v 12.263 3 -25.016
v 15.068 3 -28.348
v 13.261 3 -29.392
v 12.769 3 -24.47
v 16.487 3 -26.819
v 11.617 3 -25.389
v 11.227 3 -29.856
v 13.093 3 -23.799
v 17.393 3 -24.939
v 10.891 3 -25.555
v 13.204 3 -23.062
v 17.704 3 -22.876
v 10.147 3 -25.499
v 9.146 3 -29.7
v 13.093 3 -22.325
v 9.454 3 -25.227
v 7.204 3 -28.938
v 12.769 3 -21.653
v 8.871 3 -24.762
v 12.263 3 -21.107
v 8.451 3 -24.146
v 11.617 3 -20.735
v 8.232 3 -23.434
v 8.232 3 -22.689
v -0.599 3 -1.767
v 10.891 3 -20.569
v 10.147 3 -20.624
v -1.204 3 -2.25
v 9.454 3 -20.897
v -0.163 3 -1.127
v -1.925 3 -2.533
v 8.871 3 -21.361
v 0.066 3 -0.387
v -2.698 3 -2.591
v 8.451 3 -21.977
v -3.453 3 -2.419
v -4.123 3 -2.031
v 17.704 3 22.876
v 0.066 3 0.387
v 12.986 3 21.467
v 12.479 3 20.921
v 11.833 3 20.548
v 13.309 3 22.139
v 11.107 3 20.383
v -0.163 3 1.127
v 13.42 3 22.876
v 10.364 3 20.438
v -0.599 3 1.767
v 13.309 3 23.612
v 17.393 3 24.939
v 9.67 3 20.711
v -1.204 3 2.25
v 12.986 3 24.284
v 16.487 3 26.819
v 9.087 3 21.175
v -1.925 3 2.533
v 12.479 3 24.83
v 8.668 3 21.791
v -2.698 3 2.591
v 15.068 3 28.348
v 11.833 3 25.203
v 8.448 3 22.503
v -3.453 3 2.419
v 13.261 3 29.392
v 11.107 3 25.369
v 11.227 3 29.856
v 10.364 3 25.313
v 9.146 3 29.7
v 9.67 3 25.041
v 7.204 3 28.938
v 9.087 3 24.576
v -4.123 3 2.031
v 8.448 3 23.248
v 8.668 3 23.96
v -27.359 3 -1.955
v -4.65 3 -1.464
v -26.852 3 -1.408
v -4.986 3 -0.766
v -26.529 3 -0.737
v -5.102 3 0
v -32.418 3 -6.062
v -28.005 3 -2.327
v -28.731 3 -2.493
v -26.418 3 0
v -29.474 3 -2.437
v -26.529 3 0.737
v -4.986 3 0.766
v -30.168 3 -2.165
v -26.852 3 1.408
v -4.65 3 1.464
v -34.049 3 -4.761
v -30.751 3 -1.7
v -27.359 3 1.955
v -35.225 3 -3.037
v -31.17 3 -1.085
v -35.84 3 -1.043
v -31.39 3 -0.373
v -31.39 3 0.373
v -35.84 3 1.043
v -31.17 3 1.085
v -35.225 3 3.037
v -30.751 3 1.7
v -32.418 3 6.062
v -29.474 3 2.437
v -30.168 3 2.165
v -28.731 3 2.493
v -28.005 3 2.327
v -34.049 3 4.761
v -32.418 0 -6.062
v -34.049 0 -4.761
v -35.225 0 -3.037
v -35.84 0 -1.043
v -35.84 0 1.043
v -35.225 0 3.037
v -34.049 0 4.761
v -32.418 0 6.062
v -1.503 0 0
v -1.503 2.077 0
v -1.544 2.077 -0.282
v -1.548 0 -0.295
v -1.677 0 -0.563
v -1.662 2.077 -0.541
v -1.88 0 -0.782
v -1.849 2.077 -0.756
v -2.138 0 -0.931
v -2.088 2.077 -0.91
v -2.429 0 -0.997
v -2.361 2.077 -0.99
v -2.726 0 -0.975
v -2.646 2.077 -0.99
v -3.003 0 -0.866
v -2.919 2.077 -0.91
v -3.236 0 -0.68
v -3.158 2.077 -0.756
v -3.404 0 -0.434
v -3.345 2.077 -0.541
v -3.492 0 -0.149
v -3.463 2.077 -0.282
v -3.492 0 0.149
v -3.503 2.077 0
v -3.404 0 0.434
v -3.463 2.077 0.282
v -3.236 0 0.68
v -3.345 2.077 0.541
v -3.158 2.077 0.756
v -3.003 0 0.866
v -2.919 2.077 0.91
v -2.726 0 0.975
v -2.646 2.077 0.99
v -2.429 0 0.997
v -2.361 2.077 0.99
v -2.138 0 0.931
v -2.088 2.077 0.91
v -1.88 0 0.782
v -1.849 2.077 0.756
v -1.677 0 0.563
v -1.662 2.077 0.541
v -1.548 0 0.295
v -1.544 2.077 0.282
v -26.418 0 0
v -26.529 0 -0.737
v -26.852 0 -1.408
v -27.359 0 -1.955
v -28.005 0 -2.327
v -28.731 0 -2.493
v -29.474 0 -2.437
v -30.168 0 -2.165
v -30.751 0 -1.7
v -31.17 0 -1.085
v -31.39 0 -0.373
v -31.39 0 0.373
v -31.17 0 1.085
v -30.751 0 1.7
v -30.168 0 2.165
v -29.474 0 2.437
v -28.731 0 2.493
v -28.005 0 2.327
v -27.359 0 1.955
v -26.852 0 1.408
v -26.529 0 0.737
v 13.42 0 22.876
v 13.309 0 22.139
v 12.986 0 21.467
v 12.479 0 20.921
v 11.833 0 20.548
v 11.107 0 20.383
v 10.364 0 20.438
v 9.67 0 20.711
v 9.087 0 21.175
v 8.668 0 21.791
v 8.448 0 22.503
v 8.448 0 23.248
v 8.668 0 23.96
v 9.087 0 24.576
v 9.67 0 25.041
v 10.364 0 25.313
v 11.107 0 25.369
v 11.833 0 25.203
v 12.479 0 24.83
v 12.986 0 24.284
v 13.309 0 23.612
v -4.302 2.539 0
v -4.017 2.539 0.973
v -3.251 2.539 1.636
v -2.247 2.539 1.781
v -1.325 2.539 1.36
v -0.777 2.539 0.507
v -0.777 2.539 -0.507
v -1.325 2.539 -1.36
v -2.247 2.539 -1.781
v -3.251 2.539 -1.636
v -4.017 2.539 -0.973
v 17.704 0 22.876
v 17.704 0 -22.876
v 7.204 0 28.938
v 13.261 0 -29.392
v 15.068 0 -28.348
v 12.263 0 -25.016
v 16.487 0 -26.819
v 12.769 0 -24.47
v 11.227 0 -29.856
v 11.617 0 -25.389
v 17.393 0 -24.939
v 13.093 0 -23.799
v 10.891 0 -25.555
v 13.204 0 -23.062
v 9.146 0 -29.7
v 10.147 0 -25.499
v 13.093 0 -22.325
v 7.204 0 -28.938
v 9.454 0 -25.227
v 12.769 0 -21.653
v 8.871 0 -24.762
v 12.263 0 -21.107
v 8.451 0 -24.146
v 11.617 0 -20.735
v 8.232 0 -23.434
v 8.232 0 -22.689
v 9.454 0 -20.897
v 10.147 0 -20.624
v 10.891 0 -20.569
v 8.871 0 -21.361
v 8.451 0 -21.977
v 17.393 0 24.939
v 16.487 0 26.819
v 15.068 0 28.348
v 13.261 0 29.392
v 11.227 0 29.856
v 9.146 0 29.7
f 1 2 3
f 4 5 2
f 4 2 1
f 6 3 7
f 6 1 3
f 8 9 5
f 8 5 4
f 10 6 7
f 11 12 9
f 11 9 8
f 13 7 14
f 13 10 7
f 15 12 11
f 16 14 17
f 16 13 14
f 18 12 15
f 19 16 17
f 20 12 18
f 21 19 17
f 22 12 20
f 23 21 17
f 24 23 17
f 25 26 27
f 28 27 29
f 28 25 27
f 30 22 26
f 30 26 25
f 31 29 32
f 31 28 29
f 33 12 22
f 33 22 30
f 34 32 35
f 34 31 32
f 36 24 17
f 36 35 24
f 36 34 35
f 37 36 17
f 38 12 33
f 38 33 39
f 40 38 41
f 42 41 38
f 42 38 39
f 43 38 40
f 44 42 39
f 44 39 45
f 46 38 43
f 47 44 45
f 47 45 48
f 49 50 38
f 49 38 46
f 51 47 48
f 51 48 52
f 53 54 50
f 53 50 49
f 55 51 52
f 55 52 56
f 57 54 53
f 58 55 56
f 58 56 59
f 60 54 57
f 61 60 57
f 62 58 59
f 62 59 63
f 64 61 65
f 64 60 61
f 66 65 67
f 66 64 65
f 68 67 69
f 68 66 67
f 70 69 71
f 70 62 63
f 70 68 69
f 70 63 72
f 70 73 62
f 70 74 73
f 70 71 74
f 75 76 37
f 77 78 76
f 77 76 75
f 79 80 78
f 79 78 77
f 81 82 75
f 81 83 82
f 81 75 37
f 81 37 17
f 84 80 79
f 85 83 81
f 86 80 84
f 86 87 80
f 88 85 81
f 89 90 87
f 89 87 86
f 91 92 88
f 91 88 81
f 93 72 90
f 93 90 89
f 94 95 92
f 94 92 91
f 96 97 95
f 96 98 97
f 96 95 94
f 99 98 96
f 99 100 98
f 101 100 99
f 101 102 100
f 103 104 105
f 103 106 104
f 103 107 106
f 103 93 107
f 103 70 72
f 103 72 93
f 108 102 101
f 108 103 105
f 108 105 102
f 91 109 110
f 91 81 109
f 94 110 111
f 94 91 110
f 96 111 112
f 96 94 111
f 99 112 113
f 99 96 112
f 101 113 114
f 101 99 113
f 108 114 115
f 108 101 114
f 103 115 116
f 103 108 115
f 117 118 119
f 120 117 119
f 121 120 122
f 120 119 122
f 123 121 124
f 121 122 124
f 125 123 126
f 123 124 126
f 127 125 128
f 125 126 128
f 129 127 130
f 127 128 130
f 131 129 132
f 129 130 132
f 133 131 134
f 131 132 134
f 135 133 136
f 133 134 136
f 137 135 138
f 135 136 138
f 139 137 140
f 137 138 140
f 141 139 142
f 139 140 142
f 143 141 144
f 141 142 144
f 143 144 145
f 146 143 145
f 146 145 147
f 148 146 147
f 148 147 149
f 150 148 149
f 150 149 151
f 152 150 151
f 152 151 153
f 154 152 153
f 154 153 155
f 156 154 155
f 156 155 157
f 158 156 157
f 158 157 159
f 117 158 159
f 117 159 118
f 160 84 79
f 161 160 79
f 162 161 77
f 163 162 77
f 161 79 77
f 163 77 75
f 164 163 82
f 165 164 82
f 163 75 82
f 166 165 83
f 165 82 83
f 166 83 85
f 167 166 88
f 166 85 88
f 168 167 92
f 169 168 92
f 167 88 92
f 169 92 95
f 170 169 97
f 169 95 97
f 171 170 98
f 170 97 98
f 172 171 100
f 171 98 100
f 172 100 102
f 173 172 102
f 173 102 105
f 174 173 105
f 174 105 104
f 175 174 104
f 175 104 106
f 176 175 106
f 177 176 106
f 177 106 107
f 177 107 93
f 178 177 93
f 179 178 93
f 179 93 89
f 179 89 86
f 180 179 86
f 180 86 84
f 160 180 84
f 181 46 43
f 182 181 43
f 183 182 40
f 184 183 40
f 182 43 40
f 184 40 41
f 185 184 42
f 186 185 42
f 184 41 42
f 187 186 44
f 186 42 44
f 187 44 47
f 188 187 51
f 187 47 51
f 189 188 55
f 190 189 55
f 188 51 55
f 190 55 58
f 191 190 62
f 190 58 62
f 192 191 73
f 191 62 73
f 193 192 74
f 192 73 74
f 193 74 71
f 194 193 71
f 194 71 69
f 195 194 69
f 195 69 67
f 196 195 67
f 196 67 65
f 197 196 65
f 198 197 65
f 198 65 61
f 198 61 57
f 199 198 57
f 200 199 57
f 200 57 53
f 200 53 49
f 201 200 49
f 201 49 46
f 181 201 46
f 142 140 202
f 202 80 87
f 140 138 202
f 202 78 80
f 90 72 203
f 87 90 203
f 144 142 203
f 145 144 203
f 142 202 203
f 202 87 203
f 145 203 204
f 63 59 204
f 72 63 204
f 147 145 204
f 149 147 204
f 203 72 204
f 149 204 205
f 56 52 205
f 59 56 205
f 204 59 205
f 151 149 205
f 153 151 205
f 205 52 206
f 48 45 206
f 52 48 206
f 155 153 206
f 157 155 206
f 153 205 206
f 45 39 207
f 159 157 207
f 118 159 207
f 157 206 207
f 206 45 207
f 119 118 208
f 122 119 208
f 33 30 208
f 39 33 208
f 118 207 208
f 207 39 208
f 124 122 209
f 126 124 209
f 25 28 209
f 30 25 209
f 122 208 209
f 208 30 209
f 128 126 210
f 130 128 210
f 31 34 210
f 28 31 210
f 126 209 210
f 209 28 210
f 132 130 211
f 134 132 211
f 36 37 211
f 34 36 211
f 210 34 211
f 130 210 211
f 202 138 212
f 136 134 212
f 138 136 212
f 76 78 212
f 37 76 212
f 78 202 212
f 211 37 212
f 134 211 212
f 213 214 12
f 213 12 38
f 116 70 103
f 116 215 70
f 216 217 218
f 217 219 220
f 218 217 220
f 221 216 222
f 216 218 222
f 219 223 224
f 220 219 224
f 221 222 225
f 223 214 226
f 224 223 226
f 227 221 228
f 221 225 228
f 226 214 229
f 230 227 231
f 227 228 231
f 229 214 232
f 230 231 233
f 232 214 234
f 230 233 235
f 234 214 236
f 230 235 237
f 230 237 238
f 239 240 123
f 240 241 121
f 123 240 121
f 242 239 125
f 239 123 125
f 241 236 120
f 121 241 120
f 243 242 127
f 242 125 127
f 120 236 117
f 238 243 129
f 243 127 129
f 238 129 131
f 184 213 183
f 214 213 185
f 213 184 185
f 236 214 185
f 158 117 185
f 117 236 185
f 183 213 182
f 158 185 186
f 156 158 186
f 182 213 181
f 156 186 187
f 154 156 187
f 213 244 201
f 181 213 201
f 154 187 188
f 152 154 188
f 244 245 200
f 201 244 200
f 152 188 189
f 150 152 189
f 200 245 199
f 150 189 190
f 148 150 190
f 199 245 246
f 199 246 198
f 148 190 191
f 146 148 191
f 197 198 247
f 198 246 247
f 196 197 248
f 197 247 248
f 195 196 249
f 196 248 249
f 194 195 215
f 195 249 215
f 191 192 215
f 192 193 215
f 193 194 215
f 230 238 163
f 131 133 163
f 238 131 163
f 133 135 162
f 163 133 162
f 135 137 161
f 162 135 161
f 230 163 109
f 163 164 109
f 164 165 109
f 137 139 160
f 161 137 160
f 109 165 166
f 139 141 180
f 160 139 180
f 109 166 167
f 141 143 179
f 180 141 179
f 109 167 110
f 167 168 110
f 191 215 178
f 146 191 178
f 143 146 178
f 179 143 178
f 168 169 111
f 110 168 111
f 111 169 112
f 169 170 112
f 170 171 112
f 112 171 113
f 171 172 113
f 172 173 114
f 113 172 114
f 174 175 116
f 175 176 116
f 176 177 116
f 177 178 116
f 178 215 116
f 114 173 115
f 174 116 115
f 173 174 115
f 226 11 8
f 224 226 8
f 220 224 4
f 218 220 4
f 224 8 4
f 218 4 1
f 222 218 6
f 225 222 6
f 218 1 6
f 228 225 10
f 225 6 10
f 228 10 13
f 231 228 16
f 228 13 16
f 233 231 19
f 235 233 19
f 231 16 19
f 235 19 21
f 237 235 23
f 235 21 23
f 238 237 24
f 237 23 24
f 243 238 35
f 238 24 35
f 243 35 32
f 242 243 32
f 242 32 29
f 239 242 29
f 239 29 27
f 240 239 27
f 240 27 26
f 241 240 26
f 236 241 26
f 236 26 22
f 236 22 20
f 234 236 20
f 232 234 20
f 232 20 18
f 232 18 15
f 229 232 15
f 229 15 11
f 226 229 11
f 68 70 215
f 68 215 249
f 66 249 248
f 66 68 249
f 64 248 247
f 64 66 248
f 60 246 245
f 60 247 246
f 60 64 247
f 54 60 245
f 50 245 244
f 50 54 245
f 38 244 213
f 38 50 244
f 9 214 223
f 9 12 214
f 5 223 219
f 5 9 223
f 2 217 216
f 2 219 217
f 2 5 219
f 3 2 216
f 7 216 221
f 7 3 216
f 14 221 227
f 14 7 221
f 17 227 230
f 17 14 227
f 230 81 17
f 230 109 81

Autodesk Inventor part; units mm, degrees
ref_plane "YZ Plane" through (0, 0, 0) normal (1, 0, 0) x (0, 1, 0)
ref_plane "XZ Plane" through (0, 0, 0) normal (0, 1, 0) x (-1, 0, 0)
sketch "Szkic1" plane through (0, 0, 0) normal (0, 1, 0) x (-1, 0, 0)
  line L0 (42.918, 0) -> (-17.7038, -35)
  line L1 (-17.7038, -35) -> (-17.7038, 35)
  line L2 (-17.7038, 35) -> (42.918, 0)
  point P0 (0, 0)
  dimension "d0" = 70
  dimension "d1" = 35
  dimension "d2" = 60
  dimension "d3" = 60
extrude "Wyciągnięcie proste1" add sketch "Szkic1" along normal blind 3
fillet "Zaokrąglenie1" radius 7 3 edges at (17.7038, 1.5, 35) (17.7038, 1.5, -35) (-42.918, 1.5, 0)
sketch "Szkic2" plane through (0, 3, 0) normal (0, 1, 0) x (1, 0, 0)
  circle A0 centre (10.92, -22.8756) radius 2.5
  arc A1 (7.2038, -28.9378) -> (17.7038, -22.8756) centre (10.7038, -22.8756) ccw projected
  circle A2 centre (-28.918, 0) radius 2.5
  circle A3 centre (10.7038, 23.0617) radius 2.5
  arc A4 (-32.418, 6.0622) -> (-32.418, -6.0622) centre (-28.918, 0) ccw projected
  arc A5 (17.7038, 22.8756) -> (7.2038, 28.9378) centre (10.7038, 22.8756) ccw projected
  point P0 (0, 0)
  dimension "d7" = 0
  dimension "d8" = 5
  dimension "d9" = 5
  dimension "d10" = 5
  dimension "d11" = 0
  dimension "d12" = 0
extrude "Wyciągnięcie proste2" cut sketch "Szkic2" against normal blind 3
sketch "Szkic3" plane through (0, 3, 0) normal (0, 1, 0) x (1, 0, 0)
  line L0 (7.2038, 28.9378) -> (-32.418, 6.0622) projected
  line L1 (-32.418, -6.0622) -> (7.2038, -28.9378) projected
  line L2 (7.2038, -28.9378) -> (-32.418, -6.0622) projected
  circle A0 centre (-2.5034, 0) radius 1
  point P0 (0, 0)
  point P1 (-12.6071, -17.5)
  point P2 (-12.6071, 17.5)
  dimension "d18" = 2
extrude "Wyciągnięcie proste3" cut sketch "Szkic3" against normal blind 3
sketch "Szkic4" plane through (-32.418, 0, 6.0622) normal (-0.5, 0, 0.866) x (0.866, 0, 0.5)
  point P0 (25.0437, 0)
sketch "Szkic5" plane through (0, 3, 0) normal (0, 1, 0) x (1, 0, 0)
  circle A0 centre (-2.5034, 0) radius 1 projected
  line L0 (-3.5034, 0) -> (-3.5034, -1.2647)
  point P0 (0, 0)
  dimension "d19" = 1
ref_plane "Płaszczyzna konstrukcyjna1" through (-3.5034, 3, 0) normal (0, 0, 1) x (1, 0, 0)
sketch "Szkic6" plane through (0, 3, 0) normal (0, 1, 0) x (1, 0, 0)
  point P0 (0, 0)
sketch "Szkic7" plane through (-3.5034, 3, 0) normal (0, 0, 1) x (1, 0, 0)
  line L0 (0, 0) -> (2, 0) projected
  line L1 (1, 0) -> (-1.5981, 0)
  line L2 (1, -1.5) -> (-1.5981, 0)
  line L3 (1, -1.5) -> (1, 0)
  line L4 (1, 0.6) -> (1, -3.6) projected
  point P0 (3.5034, -3)
  dimension "d20" = 1.5
  dimension "d21" = 60
revolve "Obrót1" cut sketch "Szkic7" angle 360 about axis through (-2.5034, 3, 0) along (0, -1, 0)
sketch "Szkic8" plane through (0, 3, 0) normal (0, 1, 0) x (1, 0, 0)
  point P0 (0, 0)
properties part number "HandlePrimaryMirror" material "Aluminium 6061"
